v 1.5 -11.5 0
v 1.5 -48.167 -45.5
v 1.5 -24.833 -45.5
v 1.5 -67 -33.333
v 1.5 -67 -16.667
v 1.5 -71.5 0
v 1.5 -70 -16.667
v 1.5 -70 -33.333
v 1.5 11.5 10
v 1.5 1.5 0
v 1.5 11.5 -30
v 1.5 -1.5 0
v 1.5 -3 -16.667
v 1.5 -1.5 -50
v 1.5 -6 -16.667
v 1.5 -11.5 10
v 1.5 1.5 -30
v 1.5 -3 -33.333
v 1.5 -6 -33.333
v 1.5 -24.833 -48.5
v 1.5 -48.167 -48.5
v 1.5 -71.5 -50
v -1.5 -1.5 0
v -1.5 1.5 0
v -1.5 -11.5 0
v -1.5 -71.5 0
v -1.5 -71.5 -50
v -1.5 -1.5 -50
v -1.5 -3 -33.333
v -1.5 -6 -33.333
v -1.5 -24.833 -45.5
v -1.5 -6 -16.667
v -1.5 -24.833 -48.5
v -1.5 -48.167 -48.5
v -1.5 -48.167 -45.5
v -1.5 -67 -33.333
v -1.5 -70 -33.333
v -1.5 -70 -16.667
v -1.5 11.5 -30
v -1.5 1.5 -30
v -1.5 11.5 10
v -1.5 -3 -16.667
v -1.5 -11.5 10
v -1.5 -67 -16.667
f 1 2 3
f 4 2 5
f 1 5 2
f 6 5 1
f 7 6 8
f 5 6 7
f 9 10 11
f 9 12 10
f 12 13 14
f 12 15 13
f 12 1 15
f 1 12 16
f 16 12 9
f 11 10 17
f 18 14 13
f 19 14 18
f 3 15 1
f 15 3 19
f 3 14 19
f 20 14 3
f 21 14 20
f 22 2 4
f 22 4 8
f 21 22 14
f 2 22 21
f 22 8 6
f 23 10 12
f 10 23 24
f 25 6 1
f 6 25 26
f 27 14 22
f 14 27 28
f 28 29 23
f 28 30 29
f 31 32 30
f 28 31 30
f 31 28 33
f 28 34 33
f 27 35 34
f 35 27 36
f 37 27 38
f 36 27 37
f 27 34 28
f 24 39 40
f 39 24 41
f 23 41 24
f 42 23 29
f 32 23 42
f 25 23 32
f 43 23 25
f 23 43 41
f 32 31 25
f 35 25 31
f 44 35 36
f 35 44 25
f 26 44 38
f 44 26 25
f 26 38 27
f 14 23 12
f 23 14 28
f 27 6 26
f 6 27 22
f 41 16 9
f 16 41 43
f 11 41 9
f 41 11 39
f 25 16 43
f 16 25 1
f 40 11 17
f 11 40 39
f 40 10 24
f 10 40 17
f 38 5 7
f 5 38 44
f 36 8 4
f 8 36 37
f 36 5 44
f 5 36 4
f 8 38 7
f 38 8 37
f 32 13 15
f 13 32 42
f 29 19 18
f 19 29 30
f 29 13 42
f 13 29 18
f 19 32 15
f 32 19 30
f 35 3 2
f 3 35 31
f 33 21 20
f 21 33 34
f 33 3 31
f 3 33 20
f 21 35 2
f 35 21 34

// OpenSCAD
// file: config.scad
include <../config.scad>;

// settings specific to this pot type

inset_front = material_z/2;
inset_back = material_z/2;
inset_bottom = material_z/2;

hole_radius = 1.5;
// file: ../config.scad
// all measures in millimeters

// rendering quality
$fn = 200;
nothing = 0.05;

// material to cut from
material_z = 3;

// wall configuration: bounding box measures
wall_x = 550;
wall_y = 150;
wall_z = 400;

wall_width = 30;
foot_z = 30;

// pots are hung at wall supports
support_count = 5;
support_z = 30;

// pot configuration: outer measures of the top opening
pot_x = 70;
pot_y = 70;
pot_z = 50;

// pots have hooks to hang at the wall supports
hook_width = 10;
// main file
include <../config.scad>;
include <config.scad>;

module pot_side_without_holes(x)
{
    // side wall
    translate([
        x,
        -pot_y/2 - material_z/2,
        -pot_z/2
        ])
    cube([
        material_z,
        pot_y,
        pot_z
        ], center=true);

    // upper hook part
    translate([
        x,
        0,
        hook_width/2
        ])
    cube([
        material_z,
        hook_width*2 + material_z,
        hook_width
        ], center=true);

    // hook
    translate([
        x,
        hook_width/2 + material_z/2,
        -support_z/2
        ])
    cube([
        material_z,
        hook_width,
        support_z
        ], center=true);
}

module pot_side(x)
{
    difference()
    {
        pot_side_without_holes(x);

        // front nose cutout
        translate([
            x,
            - pot_y + inset_front,
            - pot_z/6 - pot_z/3
            ])
        cube([
            material_z + nothing,
            material_z,
            pot_z/3
            ], center=true);

        // back nose cutout
        translate([
            x,
            - material_z - inset_back,
            - pot_z/6 - pot_z/3
            ])
        cube([
            material_z + nothing,
            material_z,
            pot_z/3
            ], center=true);

        // bottom nose cutout
        translate([
            x,
            - pot_y/2 - material_z/2,
            - pot_z + material_z/2 + inset_bottom
            ])
        cube([
            material_z + nothing,
            pot_y/3,
            material_z
            ], center=true);
    }
}

pot_side(0);
